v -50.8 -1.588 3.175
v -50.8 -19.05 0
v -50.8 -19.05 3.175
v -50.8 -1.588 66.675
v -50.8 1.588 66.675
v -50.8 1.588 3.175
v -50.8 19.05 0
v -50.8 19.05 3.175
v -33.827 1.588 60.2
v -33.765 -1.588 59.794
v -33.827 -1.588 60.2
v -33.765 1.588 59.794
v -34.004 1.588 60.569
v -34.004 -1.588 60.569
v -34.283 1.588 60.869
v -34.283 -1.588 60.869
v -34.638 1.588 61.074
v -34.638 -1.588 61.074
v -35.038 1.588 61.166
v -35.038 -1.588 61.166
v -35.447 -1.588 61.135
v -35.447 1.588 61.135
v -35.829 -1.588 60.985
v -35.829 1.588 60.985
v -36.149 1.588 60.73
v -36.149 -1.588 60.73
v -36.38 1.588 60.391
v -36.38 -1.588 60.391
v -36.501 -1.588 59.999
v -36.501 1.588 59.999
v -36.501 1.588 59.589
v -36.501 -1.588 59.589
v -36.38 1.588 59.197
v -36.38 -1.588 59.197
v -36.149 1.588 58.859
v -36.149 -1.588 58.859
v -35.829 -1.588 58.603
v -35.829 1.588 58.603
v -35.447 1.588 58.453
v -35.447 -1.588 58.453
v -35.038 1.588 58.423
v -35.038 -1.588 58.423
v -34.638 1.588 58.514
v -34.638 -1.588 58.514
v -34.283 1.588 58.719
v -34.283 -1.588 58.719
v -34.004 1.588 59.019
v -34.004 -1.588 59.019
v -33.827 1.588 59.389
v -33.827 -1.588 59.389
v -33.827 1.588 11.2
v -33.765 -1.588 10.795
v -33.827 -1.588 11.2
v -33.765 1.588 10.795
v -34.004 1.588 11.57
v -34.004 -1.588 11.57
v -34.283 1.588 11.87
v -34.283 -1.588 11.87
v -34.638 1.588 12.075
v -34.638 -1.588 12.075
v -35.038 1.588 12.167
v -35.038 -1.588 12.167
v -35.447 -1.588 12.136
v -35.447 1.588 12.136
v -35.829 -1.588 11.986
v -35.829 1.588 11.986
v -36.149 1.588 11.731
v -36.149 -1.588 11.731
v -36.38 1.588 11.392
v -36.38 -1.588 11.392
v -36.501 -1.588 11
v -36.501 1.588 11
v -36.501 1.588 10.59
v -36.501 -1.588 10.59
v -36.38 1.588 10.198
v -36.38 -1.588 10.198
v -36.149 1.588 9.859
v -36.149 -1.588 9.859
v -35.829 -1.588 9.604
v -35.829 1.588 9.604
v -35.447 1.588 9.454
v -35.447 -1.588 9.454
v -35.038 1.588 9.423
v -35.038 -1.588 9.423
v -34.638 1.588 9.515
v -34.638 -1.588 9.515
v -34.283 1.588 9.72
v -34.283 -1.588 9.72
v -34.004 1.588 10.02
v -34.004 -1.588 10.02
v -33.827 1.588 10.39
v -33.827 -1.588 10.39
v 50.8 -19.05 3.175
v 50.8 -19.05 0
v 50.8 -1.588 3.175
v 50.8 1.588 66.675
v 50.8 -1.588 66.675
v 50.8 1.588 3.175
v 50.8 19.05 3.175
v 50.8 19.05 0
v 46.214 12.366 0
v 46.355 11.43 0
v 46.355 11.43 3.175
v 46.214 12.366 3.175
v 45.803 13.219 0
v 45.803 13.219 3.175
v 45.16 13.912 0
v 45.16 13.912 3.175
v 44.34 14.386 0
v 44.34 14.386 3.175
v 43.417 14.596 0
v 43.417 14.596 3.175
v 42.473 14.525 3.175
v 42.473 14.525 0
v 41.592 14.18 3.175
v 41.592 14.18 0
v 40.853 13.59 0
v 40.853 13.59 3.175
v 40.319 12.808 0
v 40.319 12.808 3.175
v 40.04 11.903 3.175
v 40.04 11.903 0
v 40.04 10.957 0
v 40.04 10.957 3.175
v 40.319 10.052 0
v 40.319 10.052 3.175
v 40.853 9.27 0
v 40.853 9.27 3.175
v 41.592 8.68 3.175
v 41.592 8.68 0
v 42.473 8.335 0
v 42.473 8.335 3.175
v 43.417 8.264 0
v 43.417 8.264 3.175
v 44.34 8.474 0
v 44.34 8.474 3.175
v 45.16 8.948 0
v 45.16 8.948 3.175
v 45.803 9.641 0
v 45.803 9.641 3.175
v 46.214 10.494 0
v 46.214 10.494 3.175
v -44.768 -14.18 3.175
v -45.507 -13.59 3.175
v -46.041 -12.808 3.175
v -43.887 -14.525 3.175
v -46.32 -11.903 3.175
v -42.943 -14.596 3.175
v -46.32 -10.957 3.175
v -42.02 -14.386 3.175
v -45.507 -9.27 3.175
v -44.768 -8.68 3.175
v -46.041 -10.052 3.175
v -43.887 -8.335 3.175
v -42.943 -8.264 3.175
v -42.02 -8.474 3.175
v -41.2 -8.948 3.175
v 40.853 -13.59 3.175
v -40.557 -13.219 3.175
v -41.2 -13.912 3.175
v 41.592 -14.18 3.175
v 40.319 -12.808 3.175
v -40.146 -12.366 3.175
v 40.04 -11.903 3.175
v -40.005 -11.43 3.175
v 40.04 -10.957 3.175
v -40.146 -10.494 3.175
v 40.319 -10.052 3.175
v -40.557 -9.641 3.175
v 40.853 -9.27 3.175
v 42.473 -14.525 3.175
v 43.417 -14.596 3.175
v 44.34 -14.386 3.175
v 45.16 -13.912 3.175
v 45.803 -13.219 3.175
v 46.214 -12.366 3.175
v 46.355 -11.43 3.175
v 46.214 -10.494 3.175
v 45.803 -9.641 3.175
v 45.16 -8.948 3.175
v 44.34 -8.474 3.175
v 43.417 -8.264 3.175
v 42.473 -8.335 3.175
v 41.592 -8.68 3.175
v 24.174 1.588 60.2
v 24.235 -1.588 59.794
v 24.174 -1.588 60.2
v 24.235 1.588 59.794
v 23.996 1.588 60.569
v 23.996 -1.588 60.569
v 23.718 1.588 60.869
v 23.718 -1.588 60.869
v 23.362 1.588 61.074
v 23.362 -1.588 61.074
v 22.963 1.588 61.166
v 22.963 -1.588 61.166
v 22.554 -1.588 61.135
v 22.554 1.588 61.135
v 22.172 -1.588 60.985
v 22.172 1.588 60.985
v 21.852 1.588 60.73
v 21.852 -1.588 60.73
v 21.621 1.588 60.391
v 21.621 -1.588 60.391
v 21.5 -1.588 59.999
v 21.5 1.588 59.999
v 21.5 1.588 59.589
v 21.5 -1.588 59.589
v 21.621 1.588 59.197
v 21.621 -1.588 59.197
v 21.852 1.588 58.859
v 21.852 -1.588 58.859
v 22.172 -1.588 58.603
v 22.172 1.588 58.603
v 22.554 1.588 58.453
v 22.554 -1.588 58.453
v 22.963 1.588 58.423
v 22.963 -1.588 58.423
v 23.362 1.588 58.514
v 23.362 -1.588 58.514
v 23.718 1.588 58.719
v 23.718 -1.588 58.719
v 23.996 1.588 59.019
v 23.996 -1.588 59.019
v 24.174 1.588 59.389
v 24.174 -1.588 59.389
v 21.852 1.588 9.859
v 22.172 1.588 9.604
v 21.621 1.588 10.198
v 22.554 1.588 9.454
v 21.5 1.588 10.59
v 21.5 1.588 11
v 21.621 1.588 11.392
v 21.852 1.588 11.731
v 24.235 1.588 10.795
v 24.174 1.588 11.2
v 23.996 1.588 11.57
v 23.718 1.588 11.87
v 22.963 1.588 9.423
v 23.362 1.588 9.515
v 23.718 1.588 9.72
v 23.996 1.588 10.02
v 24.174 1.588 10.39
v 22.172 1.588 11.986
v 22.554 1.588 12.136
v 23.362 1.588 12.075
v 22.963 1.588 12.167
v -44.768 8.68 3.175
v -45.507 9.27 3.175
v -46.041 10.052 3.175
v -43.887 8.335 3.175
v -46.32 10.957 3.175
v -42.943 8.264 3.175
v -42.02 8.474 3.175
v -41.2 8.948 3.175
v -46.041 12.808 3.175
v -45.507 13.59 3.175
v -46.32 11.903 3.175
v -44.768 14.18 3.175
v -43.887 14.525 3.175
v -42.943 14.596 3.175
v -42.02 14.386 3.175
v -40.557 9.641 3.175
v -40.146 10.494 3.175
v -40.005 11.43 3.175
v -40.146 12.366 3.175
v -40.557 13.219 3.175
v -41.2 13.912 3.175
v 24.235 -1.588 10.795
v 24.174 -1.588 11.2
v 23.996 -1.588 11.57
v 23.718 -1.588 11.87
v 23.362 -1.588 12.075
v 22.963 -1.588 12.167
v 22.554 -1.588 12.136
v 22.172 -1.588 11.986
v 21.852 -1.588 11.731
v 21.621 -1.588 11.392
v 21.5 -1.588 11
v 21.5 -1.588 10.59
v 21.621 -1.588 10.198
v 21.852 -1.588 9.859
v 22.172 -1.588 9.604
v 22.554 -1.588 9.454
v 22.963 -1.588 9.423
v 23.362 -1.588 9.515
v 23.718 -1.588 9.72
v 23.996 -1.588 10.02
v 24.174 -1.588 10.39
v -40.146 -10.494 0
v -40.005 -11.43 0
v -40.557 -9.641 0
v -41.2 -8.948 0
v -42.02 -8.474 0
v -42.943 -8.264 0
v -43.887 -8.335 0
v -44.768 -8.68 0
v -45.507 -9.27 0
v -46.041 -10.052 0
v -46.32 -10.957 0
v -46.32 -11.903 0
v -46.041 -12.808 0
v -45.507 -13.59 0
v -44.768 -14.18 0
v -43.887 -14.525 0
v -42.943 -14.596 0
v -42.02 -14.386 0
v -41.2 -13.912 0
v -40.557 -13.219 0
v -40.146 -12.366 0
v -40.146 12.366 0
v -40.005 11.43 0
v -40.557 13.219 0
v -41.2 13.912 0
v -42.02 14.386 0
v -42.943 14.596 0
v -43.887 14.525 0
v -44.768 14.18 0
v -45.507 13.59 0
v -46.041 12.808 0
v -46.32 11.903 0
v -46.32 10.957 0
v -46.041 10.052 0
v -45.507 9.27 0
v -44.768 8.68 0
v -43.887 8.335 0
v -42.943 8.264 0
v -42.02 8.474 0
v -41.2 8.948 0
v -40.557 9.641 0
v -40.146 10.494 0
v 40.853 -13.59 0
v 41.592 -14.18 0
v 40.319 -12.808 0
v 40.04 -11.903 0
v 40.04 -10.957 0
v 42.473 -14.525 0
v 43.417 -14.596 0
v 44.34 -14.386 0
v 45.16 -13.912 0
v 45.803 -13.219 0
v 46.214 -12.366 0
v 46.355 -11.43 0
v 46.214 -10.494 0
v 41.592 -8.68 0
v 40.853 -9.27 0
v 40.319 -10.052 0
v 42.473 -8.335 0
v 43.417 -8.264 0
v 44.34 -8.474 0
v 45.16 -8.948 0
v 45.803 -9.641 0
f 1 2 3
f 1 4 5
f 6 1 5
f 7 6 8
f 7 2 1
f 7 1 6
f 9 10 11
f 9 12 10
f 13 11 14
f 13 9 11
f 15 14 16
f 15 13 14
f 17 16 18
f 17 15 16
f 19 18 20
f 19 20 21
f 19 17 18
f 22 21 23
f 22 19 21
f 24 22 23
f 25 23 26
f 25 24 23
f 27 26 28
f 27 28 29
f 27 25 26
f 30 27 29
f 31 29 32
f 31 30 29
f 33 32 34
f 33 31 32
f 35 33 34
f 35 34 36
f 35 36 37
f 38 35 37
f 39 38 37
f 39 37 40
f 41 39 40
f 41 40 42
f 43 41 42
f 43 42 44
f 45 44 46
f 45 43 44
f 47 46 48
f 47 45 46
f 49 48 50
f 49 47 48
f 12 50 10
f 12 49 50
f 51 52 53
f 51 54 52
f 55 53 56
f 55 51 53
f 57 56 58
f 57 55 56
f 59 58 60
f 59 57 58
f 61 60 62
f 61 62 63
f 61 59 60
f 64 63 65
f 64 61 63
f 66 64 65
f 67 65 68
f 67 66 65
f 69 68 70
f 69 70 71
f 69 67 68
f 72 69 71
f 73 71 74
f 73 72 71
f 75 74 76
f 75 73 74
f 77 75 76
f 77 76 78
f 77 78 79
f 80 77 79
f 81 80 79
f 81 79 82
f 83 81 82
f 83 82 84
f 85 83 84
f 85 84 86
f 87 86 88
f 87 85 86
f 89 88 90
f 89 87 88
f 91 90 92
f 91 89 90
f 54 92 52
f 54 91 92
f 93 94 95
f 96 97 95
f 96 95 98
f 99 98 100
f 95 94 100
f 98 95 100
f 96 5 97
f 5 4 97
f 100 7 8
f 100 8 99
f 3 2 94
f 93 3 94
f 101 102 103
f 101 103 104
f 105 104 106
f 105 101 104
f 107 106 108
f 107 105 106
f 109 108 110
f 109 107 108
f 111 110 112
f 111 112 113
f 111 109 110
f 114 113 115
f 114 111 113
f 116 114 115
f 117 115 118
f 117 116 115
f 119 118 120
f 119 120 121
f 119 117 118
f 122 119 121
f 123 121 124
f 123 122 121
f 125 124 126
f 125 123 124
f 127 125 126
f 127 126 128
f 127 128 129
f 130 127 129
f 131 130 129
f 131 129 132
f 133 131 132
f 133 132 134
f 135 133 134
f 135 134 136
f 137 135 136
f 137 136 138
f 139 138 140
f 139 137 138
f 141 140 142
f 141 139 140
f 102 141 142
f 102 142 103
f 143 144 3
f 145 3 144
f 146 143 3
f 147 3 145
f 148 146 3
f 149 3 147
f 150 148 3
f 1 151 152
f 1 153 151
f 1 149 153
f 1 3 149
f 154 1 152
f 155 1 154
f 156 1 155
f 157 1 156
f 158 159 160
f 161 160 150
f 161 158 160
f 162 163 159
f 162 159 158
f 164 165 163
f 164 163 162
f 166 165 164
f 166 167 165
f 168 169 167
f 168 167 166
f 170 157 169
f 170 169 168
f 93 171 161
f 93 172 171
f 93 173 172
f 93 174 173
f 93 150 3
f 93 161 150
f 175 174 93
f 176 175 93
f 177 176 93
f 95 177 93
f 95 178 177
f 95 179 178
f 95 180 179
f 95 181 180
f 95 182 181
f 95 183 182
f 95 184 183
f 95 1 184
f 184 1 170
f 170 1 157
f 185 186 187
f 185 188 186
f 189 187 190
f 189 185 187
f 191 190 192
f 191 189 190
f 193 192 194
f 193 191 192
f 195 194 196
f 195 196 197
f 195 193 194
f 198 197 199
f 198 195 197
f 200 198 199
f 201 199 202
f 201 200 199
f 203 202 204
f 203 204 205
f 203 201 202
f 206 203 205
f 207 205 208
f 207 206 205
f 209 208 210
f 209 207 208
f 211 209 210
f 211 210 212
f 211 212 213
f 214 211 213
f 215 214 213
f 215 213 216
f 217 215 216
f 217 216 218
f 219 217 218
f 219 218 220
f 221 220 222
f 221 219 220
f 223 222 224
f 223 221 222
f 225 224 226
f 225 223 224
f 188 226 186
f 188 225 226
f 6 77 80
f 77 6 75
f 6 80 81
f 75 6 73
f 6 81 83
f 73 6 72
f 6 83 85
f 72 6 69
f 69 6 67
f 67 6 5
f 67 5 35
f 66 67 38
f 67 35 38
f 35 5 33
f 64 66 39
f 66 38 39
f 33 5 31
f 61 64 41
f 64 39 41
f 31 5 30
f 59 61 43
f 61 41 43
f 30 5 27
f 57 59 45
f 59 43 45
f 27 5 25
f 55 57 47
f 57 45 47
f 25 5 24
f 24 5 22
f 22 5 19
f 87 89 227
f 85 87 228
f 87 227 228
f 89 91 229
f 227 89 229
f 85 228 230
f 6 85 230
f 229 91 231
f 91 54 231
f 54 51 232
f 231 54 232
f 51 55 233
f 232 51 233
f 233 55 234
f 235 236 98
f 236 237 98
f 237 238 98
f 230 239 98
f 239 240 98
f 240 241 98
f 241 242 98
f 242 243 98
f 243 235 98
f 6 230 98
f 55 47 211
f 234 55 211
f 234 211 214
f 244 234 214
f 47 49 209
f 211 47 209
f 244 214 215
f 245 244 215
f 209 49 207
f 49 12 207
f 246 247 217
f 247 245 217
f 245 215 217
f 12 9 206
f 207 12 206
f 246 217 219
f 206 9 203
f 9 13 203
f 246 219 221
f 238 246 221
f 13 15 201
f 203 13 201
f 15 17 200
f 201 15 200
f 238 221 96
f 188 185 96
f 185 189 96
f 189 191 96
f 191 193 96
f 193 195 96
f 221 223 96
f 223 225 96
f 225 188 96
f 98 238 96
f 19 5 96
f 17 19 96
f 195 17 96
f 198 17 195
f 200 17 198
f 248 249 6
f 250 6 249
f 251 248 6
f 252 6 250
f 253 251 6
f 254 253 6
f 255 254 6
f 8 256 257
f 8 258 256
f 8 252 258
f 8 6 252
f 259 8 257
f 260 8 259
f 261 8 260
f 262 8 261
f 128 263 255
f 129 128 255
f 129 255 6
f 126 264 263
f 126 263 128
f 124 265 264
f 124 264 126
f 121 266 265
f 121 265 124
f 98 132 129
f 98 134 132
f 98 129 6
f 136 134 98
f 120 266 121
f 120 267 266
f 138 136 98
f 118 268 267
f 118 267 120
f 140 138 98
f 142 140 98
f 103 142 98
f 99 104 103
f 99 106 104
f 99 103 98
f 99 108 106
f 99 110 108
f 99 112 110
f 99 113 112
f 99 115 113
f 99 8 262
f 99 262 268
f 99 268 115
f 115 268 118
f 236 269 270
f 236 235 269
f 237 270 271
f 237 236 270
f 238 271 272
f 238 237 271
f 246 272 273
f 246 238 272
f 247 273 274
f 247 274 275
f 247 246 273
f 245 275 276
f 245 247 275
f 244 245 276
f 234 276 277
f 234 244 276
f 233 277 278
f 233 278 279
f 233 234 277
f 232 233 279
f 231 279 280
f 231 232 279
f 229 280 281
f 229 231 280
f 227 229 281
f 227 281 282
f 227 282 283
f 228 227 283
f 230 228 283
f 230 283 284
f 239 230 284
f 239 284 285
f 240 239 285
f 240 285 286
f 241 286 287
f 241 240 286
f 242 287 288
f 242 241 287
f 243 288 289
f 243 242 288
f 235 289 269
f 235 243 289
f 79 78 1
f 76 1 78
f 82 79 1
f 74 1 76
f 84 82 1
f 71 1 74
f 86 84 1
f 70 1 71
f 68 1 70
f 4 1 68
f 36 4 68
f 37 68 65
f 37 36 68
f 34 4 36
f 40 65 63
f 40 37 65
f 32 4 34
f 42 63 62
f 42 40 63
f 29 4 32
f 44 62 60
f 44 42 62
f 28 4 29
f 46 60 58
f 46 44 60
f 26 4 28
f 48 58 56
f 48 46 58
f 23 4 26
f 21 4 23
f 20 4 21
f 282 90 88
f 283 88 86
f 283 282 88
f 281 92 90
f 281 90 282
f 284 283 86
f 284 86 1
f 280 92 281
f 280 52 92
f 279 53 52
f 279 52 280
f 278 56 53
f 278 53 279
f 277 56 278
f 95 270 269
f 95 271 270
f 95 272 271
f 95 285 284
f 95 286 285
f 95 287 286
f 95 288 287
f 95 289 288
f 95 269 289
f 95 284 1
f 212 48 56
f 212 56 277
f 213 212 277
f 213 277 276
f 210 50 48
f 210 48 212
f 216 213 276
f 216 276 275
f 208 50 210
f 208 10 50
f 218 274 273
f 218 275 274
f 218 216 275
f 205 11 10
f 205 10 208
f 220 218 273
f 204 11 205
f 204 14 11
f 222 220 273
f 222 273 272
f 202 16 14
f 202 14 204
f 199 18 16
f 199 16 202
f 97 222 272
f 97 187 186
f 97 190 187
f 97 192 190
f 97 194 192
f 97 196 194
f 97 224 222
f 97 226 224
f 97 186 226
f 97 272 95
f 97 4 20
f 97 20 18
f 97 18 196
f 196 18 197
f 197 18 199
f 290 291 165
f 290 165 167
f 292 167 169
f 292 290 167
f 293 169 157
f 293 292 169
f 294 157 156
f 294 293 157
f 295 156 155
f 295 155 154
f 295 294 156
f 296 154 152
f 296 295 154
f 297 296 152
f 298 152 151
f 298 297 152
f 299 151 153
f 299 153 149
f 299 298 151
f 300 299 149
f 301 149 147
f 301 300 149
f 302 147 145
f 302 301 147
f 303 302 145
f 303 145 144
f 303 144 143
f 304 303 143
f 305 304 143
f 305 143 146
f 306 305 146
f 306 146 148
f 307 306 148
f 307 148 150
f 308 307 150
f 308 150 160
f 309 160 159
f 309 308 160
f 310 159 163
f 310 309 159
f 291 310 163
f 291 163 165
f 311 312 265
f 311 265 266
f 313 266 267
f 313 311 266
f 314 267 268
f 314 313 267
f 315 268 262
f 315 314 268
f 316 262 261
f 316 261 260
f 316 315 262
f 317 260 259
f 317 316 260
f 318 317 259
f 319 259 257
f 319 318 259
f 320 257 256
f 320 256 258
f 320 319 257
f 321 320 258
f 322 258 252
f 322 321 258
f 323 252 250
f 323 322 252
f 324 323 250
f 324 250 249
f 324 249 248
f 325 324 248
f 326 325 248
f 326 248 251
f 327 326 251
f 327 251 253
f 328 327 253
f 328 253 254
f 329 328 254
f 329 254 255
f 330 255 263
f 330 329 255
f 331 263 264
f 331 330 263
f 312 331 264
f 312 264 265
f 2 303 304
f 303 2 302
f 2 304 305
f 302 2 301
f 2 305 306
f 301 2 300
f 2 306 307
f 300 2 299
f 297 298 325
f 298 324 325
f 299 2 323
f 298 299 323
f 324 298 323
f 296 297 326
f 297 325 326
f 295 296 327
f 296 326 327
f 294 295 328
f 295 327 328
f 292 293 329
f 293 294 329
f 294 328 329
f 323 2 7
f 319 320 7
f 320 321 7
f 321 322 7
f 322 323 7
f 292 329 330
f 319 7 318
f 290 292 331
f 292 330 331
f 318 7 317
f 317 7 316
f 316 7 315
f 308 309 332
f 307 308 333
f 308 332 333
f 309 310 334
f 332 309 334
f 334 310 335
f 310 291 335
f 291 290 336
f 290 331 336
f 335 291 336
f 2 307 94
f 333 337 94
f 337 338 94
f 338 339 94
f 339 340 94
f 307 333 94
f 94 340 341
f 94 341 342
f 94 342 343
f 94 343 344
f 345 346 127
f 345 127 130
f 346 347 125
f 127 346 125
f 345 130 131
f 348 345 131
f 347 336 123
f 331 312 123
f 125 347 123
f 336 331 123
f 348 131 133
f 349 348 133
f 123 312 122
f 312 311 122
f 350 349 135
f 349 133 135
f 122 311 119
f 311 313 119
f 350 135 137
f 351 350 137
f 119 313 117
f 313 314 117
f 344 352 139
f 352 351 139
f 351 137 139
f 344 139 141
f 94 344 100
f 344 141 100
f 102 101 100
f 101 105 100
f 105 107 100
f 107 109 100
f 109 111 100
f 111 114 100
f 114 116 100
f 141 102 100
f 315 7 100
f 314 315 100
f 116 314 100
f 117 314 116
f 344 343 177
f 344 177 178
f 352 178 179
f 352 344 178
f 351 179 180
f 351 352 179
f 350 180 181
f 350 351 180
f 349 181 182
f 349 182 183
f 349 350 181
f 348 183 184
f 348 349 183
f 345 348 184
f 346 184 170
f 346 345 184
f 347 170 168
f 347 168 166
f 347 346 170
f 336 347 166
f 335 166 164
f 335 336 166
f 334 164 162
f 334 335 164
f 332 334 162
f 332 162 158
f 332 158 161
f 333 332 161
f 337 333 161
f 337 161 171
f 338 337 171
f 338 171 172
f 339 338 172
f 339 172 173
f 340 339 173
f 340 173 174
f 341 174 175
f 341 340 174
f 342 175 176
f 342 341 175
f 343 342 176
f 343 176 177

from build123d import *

# Parameters (mm, degrees)
F0_W     = 101.6
F0_H     = 38.1
F0_R     = 3.175
F1_DEPTH = 3.175
F2_W     = 101.6
F2_H     = 63.5
F2_R     = 1.37541
F3_DEPTH = 1.5875


with BuildPart() as f1:
    # F0 (on Top) → F1 (new body)
    with BuildSketch(Plane.XY):
        Rectangle(F0_W, F0_H)
        with Locations((-43.18, -11.43)):
            Circle(F0_R, mode=Mode.SUBTRACT)
        with Locations((43.18, -11.43)):
            Circle(F0_R, mode=Mode.SUBTRACT)
        with Locations((-43.18, 11.43)):
            Circle(F0_R, mode=Mode.SUBTRACT)
        with Locations((43.18, 11.43)):
            Circle(F0_R, mode=Mode.SUBTRACT)
    extrude(amount=F1_DEPTH)

    # F2 (on Front) → F3 (join, symmetric)
    with BuildSketch(Plane.XZ):
        with Locations((0, 34.925)):
            Rectangle(F2_W, F2_H)
        with Locations((-35.1409, 10.795)):
            Circle(F2_R, mode=Mode.SUBTRACT)
        with Locations((22.86, 10.795)):
            Circle(F2_R, mode=Mode.SUBTRACT)
        with Locations((-35.1409, 59.79414)):
            Circle(F2_R, mode=Mode.SUBTRACT)
        with Locations((22.86, 59.79414)):
            Circle(F2_R, mode=Mode.SUBTRACT)
    extrude(amount=F3_DEPTH, both=True)


solid = f1.part
